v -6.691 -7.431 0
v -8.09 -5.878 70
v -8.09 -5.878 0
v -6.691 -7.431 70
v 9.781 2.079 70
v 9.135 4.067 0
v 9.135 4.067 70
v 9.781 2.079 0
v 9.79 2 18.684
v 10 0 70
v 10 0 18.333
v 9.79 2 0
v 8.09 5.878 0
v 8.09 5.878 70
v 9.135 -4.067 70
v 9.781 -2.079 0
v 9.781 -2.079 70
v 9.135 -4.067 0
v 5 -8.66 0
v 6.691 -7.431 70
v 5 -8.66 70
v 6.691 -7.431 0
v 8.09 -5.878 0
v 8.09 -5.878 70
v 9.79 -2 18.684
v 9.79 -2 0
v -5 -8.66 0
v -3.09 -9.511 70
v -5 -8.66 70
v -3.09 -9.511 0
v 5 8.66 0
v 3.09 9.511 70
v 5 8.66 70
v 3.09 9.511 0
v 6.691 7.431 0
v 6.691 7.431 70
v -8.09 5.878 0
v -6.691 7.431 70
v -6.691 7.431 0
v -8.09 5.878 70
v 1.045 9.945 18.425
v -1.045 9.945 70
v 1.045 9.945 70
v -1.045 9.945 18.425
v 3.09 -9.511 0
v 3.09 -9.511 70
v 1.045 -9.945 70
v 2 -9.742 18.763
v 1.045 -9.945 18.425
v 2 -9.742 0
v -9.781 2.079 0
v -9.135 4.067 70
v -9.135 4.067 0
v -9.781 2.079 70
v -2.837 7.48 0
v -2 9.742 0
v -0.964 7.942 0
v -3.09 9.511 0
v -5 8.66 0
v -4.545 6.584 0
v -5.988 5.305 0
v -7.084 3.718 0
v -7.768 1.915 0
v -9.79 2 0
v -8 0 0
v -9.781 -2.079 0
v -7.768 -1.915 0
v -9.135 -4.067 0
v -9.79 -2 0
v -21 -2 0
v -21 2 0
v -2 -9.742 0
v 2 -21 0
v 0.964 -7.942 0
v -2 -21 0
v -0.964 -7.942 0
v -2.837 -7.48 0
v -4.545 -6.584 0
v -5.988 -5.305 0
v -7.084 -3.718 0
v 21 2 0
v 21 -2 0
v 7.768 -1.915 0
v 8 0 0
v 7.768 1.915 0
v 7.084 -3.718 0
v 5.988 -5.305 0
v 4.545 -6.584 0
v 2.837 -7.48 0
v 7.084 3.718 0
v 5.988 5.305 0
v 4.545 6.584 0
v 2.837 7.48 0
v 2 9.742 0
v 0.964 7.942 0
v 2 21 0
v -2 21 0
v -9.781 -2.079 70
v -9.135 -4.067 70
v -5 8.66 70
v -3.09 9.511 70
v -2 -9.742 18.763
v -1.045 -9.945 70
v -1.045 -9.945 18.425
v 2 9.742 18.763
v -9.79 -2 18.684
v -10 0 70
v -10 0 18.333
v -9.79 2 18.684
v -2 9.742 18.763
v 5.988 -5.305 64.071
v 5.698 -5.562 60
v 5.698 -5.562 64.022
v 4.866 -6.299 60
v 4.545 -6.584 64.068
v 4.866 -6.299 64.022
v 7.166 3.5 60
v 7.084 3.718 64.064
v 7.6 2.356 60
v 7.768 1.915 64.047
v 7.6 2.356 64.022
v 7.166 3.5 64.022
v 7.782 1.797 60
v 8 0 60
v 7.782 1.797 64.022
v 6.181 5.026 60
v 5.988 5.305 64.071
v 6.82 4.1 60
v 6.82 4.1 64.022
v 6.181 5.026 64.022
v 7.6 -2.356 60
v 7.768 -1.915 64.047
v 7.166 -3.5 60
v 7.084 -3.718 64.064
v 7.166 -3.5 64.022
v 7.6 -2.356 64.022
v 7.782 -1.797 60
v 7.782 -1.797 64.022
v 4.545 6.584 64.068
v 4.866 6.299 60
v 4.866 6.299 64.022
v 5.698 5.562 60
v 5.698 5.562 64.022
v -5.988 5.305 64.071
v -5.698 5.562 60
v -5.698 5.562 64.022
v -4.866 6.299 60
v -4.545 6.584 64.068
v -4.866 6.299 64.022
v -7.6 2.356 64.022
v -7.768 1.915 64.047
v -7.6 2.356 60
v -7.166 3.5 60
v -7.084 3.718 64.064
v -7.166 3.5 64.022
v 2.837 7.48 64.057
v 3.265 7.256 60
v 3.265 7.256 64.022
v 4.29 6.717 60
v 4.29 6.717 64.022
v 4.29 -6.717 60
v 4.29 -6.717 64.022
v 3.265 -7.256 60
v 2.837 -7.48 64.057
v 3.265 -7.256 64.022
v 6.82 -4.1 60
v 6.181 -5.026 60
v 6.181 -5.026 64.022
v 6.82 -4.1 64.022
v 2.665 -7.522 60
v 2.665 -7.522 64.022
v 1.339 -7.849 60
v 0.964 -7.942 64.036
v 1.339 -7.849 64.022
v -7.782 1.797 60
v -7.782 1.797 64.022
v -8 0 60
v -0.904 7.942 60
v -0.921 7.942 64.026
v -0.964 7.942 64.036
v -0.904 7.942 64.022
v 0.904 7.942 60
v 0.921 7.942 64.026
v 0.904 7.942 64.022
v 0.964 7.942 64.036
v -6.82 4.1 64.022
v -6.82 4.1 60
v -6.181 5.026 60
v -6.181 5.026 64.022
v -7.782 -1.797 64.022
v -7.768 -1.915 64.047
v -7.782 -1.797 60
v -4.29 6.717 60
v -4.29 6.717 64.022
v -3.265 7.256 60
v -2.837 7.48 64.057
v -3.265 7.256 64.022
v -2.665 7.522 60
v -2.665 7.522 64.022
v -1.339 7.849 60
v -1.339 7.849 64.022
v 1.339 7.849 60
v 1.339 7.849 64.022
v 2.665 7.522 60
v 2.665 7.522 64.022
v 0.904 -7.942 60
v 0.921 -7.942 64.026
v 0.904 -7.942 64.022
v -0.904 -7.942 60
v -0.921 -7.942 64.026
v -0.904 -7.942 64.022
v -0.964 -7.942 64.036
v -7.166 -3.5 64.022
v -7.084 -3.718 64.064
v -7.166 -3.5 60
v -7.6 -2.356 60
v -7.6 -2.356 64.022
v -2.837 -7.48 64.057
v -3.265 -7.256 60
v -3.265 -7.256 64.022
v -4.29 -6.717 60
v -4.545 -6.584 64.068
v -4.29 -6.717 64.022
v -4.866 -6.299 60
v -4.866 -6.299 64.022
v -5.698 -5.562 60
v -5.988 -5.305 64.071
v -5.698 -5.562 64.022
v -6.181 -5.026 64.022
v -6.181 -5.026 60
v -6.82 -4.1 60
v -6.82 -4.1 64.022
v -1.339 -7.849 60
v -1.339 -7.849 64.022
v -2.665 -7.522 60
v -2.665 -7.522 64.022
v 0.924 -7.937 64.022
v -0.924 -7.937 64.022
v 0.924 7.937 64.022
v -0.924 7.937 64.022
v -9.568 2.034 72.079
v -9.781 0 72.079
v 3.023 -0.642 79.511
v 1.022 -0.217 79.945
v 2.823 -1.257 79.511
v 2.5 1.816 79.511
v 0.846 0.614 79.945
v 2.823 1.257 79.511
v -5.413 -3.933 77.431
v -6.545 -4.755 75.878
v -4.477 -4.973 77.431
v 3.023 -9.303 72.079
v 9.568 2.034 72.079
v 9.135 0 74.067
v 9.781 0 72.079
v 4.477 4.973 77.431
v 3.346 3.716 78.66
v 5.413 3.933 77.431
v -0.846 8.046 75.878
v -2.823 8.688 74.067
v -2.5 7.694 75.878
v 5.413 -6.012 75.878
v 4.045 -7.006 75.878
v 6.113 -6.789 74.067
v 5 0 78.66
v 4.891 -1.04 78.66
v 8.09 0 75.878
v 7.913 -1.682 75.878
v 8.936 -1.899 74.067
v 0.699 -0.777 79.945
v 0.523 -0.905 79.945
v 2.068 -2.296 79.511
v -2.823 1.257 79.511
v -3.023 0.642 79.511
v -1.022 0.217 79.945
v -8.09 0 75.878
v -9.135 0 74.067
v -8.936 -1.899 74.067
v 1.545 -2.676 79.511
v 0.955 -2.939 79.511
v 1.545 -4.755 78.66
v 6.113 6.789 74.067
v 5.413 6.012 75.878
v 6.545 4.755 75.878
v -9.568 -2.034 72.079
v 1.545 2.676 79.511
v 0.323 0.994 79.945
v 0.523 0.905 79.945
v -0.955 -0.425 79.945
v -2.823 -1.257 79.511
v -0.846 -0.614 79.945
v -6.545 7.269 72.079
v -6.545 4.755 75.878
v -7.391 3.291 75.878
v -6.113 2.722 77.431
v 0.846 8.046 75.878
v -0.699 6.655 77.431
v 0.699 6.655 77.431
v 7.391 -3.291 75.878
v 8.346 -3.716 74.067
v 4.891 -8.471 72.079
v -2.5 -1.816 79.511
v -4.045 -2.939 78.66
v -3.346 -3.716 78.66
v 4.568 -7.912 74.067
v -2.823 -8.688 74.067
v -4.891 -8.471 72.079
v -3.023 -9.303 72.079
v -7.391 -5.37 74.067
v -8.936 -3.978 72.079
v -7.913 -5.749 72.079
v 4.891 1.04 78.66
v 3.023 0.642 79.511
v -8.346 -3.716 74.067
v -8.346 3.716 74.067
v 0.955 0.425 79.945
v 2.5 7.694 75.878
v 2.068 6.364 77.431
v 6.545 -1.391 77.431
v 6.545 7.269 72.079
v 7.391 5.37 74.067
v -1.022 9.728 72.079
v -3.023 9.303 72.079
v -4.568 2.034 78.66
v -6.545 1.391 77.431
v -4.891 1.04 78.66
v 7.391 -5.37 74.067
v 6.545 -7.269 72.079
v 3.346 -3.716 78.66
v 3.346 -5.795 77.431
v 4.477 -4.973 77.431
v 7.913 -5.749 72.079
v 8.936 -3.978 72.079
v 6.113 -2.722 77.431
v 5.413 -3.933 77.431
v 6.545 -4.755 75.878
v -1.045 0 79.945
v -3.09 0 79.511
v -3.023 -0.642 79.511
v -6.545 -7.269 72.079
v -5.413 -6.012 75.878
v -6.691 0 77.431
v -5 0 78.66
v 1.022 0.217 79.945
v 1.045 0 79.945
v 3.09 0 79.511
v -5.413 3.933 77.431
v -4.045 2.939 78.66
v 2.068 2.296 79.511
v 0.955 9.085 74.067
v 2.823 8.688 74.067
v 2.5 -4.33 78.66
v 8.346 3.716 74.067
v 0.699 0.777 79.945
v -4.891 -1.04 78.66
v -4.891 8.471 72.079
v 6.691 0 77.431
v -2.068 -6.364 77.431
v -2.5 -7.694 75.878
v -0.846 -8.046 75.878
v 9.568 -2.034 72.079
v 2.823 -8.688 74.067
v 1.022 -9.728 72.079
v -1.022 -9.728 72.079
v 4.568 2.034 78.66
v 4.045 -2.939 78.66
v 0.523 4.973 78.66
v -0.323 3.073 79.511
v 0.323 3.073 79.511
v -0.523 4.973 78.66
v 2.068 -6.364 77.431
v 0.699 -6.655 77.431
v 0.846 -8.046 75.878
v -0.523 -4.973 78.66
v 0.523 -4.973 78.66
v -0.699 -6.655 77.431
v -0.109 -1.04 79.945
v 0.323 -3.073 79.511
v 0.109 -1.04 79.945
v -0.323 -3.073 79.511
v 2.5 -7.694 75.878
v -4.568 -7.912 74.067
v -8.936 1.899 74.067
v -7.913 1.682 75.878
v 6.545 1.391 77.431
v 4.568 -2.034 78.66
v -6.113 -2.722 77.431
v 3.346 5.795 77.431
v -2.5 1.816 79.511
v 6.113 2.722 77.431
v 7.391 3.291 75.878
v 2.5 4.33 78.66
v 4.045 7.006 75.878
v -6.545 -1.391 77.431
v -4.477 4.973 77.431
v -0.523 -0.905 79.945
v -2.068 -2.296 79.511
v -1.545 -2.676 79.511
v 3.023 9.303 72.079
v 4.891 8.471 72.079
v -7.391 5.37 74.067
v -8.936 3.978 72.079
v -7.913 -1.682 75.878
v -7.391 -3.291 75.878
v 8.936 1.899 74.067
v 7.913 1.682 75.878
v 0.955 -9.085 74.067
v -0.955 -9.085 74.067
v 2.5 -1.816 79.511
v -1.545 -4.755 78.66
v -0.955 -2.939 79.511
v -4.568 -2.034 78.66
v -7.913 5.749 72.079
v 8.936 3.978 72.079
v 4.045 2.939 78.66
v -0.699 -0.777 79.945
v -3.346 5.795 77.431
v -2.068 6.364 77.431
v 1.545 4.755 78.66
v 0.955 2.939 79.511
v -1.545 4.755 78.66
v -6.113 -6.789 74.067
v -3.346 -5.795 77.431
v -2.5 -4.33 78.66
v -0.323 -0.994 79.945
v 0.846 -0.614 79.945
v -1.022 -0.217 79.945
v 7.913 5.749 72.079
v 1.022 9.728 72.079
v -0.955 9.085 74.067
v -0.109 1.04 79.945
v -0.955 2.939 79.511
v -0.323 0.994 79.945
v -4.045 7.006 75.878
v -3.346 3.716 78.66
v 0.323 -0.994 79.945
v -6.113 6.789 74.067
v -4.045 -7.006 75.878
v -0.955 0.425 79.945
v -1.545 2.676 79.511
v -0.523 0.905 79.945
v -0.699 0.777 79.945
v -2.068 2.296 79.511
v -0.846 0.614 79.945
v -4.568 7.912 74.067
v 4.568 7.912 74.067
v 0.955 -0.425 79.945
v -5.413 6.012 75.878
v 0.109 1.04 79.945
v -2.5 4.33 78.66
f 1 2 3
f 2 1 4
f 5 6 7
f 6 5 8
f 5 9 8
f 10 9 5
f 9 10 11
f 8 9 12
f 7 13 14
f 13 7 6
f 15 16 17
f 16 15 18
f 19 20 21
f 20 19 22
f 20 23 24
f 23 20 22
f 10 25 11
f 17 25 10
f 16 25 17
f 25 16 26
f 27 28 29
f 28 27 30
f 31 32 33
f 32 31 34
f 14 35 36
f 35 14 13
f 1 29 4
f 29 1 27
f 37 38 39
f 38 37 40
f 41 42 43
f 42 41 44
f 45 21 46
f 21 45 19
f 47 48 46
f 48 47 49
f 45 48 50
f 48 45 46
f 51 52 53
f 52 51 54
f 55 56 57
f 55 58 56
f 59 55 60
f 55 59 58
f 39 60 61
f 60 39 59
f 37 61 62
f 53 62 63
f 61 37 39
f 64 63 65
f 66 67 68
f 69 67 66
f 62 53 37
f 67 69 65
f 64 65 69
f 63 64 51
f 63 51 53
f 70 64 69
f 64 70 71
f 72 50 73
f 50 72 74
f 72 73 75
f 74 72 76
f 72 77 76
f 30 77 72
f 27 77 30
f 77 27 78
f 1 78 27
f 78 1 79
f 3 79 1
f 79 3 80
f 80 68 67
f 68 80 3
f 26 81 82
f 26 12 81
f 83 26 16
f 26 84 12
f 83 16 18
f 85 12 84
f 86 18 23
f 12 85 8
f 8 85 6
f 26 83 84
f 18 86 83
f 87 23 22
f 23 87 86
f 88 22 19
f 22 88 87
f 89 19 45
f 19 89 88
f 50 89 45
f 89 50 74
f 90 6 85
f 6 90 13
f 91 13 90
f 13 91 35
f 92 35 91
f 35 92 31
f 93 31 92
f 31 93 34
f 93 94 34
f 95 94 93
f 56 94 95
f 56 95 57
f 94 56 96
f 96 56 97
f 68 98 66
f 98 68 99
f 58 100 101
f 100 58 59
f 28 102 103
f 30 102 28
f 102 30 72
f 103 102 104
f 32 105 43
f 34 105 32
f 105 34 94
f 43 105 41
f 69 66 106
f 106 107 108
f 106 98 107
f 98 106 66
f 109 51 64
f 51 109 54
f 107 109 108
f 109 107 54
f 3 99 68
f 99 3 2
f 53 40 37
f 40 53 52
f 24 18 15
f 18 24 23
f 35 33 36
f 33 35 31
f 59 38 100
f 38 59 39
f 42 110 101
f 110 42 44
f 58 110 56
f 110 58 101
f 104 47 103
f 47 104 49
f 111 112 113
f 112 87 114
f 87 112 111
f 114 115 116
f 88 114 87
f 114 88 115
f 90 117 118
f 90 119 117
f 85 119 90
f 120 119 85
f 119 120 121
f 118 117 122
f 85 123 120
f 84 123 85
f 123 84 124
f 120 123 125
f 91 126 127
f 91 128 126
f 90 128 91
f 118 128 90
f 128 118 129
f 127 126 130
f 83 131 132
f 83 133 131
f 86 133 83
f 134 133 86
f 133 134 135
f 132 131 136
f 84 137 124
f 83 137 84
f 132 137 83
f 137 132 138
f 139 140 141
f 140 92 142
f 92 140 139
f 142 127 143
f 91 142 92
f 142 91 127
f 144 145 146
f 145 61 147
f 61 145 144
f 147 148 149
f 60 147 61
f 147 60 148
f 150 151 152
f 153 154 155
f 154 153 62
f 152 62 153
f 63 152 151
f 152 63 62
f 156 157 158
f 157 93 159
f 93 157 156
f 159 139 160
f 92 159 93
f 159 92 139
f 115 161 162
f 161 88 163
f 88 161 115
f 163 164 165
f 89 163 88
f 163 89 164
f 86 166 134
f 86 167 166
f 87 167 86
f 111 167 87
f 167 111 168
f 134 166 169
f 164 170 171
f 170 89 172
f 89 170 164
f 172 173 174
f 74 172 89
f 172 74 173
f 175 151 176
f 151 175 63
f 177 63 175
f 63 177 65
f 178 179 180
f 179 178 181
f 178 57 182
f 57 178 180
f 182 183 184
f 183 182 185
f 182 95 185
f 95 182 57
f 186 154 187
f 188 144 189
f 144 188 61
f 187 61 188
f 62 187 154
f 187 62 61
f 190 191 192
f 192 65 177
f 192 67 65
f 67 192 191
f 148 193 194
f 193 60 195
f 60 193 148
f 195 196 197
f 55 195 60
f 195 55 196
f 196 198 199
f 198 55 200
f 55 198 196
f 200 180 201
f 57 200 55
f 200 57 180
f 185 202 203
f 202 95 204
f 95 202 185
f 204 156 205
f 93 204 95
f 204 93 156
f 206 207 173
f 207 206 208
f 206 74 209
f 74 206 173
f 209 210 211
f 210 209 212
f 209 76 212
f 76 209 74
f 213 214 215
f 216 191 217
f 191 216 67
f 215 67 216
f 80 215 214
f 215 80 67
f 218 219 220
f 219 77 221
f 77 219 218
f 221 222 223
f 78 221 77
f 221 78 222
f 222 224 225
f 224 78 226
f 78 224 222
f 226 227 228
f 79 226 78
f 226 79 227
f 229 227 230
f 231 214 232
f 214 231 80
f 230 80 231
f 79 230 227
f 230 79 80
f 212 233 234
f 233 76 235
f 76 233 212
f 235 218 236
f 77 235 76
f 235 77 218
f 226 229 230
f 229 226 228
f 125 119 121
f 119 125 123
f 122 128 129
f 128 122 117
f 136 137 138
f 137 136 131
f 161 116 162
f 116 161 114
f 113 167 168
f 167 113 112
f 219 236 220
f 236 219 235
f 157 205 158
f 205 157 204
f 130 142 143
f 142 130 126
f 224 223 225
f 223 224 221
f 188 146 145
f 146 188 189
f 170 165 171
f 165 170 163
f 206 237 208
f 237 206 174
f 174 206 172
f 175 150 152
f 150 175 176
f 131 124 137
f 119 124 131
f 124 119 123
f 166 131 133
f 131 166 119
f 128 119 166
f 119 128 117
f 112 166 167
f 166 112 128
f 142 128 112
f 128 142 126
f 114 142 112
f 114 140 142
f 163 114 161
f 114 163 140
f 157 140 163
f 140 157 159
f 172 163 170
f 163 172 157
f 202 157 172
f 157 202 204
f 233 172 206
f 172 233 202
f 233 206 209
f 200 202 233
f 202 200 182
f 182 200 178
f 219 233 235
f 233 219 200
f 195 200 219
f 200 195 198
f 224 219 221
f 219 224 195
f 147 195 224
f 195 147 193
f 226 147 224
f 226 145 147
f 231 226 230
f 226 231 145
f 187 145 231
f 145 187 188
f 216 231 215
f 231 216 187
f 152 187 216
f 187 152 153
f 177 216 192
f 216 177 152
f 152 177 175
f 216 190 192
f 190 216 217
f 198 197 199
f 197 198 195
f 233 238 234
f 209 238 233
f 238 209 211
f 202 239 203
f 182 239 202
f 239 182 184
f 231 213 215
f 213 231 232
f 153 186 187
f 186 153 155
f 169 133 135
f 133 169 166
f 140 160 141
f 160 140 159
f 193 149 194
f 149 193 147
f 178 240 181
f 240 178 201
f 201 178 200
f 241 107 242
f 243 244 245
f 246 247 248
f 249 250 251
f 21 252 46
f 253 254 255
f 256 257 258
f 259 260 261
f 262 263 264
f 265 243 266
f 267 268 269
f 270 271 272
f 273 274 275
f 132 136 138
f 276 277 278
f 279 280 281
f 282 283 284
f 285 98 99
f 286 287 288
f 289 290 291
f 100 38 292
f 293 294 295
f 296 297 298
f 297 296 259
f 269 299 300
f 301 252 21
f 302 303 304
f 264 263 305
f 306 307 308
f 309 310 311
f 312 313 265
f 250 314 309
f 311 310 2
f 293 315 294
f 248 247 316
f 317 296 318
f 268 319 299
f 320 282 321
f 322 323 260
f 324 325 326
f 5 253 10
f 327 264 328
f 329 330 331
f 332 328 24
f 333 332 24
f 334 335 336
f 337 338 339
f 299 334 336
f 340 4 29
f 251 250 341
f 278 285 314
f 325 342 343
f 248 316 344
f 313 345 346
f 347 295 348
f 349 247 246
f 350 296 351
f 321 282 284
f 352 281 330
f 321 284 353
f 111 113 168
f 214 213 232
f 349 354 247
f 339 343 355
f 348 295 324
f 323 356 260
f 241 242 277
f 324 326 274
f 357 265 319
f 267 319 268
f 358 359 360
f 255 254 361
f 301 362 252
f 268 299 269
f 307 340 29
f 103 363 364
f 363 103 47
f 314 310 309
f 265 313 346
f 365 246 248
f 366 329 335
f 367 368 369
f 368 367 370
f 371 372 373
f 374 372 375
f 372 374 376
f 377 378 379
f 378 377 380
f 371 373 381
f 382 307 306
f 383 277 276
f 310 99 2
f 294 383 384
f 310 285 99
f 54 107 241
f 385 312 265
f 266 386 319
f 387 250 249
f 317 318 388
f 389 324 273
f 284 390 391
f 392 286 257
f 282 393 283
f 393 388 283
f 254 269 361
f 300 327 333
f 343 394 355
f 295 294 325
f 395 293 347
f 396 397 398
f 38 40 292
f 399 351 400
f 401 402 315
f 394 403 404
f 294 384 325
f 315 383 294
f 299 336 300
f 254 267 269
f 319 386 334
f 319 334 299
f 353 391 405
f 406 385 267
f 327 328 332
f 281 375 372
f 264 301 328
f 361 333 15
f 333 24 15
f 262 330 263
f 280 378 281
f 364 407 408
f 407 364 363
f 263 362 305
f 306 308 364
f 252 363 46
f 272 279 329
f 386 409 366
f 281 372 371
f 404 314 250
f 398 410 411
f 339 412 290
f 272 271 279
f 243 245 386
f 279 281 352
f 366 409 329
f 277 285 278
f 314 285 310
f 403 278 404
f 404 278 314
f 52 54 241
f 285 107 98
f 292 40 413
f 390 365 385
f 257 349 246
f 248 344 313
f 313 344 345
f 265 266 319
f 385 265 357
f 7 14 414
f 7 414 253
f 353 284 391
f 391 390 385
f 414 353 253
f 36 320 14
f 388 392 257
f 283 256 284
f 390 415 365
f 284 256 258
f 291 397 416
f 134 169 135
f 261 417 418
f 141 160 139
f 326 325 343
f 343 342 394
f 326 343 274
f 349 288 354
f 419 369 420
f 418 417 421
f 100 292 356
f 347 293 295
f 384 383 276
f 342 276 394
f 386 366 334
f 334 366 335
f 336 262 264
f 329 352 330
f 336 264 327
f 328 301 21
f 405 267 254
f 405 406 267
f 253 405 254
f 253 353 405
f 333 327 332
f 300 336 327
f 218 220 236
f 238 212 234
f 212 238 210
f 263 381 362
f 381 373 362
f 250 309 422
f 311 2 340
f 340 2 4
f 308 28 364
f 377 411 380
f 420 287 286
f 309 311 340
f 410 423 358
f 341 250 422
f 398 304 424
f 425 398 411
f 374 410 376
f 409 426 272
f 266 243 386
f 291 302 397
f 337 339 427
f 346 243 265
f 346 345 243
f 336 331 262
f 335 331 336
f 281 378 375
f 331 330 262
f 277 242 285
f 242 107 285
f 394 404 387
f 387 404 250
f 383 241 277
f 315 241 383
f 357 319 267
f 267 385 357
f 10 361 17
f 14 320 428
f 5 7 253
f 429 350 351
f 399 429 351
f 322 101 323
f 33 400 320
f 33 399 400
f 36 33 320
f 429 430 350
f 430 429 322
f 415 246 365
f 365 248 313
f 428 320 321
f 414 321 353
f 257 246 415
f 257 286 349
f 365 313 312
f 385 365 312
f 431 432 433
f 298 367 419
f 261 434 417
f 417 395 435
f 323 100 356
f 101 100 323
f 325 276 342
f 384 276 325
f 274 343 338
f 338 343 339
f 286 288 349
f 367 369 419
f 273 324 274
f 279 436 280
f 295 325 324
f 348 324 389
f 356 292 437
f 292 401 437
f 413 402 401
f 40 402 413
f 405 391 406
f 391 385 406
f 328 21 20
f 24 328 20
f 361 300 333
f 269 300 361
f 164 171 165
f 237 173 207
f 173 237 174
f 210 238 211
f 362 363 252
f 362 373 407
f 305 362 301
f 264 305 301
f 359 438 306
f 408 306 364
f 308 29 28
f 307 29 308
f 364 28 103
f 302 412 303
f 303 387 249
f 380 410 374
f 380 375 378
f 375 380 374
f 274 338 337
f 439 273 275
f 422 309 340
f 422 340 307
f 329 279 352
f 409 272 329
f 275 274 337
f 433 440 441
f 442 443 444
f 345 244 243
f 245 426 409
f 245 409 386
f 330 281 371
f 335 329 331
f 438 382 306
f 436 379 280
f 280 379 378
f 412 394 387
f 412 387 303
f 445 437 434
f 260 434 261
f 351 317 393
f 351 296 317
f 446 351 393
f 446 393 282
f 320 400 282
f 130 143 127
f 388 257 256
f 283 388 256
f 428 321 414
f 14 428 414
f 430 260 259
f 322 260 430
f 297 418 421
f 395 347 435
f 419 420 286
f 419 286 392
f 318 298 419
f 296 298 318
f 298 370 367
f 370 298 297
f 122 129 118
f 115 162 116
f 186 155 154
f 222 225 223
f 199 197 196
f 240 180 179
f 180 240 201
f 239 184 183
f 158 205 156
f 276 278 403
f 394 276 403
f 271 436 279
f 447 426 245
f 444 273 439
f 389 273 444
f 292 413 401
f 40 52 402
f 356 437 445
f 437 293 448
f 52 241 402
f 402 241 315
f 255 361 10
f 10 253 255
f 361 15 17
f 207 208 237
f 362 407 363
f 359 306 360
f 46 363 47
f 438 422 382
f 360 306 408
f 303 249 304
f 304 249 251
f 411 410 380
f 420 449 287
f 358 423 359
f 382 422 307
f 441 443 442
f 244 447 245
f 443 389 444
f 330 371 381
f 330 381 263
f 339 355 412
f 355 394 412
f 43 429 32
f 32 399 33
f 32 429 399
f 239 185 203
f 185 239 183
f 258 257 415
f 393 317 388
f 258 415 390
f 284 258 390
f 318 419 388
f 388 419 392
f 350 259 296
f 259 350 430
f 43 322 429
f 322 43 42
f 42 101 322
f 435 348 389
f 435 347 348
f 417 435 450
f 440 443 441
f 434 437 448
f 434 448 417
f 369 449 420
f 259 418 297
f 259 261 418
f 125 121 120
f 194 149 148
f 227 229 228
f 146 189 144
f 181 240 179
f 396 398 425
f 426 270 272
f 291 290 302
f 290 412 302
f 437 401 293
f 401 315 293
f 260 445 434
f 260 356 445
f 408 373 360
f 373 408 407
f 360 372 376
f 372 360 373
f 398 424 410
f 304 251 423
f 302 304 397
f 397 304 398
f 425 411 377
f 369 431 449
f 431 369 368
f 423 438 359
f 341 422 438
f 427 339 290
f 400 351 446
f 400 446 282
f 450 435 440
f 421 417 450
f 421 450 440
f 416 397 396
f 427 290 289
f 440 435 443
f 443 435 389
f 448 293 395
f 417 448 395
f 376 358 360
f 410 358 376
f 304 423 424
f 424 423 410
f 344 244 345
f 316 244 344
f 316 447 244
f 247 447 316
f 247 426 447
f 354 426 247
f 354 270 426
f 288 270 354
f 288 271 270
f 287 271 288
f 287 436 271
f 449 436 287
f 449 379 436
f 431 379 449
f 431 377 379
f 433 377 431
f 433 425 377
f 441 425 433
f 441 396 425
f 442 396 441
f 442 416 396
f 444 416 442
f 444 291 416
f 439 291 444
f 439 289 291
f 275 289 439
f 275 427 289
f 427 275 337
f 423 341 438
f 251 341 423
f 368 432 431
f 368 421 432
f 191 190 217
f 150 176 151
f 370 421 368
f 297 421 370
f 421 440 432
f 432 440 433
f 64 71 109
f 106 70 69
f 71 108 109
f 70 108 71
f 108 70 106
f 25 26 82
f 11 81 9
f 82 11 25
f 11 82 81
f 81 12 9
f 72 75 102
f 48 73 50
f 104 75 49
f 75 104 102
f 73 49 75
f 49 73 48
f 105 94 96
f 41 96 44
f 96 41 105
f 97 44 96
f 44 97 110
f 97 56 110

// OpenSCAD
difference()
{
	for(i=[0:0])
	rotate([0,120*i,0])
	cylinder(r=10,h=70);

	for(i=[0:0])
	rotate([0,120*i,0])
	translate([0,0,-1])
	cylinder(r=8,h=72);
}

translate([0,0,60]) scale([0.8,0.8,1]) cylinder(10, 10, 10);

translate([0,0,70]) scale([1,1,1]) sphere(10);




b = 60;
h = 10;
w = 4;

//the fins
rotate(a=[90,-90,0])
linear_extrude(height = w, center = true, convexity = 10, twist = 0)
translate([0,9,0]) scale([2,0.2,1])polygon(points=[[0,0],[h,0],[0,b]], paths=[[0,1,2]]);


rotate(a=[90,-90,180])
linear_extrude(height = w, center = true, convexity = 10, twist = 0)
translate([0,9,0]) scale([2,0.2,1])polygon(points=[[0,0],[h,0],[0,b]], paths=[[0,1,2]]);


rotate(a=[180,-90,0])
linear_extrude(height = w, center = true, convexity = 10, twist = 0)
translate([0,9,0]) scale([2,0.2,1])polygon(points=[[0,0],[h,0],[0,b]], paths=[[0,1,2]]);


rotate(a=[180,-90,180])
linear_extrude(height = w, center = true, convexity = 10, twist = 0)
translate([0,9,0]) scale([2,0.2,1])polygon(points=[[0,0],[h,0],[0,b]], paths=[[0,1,2]]);
